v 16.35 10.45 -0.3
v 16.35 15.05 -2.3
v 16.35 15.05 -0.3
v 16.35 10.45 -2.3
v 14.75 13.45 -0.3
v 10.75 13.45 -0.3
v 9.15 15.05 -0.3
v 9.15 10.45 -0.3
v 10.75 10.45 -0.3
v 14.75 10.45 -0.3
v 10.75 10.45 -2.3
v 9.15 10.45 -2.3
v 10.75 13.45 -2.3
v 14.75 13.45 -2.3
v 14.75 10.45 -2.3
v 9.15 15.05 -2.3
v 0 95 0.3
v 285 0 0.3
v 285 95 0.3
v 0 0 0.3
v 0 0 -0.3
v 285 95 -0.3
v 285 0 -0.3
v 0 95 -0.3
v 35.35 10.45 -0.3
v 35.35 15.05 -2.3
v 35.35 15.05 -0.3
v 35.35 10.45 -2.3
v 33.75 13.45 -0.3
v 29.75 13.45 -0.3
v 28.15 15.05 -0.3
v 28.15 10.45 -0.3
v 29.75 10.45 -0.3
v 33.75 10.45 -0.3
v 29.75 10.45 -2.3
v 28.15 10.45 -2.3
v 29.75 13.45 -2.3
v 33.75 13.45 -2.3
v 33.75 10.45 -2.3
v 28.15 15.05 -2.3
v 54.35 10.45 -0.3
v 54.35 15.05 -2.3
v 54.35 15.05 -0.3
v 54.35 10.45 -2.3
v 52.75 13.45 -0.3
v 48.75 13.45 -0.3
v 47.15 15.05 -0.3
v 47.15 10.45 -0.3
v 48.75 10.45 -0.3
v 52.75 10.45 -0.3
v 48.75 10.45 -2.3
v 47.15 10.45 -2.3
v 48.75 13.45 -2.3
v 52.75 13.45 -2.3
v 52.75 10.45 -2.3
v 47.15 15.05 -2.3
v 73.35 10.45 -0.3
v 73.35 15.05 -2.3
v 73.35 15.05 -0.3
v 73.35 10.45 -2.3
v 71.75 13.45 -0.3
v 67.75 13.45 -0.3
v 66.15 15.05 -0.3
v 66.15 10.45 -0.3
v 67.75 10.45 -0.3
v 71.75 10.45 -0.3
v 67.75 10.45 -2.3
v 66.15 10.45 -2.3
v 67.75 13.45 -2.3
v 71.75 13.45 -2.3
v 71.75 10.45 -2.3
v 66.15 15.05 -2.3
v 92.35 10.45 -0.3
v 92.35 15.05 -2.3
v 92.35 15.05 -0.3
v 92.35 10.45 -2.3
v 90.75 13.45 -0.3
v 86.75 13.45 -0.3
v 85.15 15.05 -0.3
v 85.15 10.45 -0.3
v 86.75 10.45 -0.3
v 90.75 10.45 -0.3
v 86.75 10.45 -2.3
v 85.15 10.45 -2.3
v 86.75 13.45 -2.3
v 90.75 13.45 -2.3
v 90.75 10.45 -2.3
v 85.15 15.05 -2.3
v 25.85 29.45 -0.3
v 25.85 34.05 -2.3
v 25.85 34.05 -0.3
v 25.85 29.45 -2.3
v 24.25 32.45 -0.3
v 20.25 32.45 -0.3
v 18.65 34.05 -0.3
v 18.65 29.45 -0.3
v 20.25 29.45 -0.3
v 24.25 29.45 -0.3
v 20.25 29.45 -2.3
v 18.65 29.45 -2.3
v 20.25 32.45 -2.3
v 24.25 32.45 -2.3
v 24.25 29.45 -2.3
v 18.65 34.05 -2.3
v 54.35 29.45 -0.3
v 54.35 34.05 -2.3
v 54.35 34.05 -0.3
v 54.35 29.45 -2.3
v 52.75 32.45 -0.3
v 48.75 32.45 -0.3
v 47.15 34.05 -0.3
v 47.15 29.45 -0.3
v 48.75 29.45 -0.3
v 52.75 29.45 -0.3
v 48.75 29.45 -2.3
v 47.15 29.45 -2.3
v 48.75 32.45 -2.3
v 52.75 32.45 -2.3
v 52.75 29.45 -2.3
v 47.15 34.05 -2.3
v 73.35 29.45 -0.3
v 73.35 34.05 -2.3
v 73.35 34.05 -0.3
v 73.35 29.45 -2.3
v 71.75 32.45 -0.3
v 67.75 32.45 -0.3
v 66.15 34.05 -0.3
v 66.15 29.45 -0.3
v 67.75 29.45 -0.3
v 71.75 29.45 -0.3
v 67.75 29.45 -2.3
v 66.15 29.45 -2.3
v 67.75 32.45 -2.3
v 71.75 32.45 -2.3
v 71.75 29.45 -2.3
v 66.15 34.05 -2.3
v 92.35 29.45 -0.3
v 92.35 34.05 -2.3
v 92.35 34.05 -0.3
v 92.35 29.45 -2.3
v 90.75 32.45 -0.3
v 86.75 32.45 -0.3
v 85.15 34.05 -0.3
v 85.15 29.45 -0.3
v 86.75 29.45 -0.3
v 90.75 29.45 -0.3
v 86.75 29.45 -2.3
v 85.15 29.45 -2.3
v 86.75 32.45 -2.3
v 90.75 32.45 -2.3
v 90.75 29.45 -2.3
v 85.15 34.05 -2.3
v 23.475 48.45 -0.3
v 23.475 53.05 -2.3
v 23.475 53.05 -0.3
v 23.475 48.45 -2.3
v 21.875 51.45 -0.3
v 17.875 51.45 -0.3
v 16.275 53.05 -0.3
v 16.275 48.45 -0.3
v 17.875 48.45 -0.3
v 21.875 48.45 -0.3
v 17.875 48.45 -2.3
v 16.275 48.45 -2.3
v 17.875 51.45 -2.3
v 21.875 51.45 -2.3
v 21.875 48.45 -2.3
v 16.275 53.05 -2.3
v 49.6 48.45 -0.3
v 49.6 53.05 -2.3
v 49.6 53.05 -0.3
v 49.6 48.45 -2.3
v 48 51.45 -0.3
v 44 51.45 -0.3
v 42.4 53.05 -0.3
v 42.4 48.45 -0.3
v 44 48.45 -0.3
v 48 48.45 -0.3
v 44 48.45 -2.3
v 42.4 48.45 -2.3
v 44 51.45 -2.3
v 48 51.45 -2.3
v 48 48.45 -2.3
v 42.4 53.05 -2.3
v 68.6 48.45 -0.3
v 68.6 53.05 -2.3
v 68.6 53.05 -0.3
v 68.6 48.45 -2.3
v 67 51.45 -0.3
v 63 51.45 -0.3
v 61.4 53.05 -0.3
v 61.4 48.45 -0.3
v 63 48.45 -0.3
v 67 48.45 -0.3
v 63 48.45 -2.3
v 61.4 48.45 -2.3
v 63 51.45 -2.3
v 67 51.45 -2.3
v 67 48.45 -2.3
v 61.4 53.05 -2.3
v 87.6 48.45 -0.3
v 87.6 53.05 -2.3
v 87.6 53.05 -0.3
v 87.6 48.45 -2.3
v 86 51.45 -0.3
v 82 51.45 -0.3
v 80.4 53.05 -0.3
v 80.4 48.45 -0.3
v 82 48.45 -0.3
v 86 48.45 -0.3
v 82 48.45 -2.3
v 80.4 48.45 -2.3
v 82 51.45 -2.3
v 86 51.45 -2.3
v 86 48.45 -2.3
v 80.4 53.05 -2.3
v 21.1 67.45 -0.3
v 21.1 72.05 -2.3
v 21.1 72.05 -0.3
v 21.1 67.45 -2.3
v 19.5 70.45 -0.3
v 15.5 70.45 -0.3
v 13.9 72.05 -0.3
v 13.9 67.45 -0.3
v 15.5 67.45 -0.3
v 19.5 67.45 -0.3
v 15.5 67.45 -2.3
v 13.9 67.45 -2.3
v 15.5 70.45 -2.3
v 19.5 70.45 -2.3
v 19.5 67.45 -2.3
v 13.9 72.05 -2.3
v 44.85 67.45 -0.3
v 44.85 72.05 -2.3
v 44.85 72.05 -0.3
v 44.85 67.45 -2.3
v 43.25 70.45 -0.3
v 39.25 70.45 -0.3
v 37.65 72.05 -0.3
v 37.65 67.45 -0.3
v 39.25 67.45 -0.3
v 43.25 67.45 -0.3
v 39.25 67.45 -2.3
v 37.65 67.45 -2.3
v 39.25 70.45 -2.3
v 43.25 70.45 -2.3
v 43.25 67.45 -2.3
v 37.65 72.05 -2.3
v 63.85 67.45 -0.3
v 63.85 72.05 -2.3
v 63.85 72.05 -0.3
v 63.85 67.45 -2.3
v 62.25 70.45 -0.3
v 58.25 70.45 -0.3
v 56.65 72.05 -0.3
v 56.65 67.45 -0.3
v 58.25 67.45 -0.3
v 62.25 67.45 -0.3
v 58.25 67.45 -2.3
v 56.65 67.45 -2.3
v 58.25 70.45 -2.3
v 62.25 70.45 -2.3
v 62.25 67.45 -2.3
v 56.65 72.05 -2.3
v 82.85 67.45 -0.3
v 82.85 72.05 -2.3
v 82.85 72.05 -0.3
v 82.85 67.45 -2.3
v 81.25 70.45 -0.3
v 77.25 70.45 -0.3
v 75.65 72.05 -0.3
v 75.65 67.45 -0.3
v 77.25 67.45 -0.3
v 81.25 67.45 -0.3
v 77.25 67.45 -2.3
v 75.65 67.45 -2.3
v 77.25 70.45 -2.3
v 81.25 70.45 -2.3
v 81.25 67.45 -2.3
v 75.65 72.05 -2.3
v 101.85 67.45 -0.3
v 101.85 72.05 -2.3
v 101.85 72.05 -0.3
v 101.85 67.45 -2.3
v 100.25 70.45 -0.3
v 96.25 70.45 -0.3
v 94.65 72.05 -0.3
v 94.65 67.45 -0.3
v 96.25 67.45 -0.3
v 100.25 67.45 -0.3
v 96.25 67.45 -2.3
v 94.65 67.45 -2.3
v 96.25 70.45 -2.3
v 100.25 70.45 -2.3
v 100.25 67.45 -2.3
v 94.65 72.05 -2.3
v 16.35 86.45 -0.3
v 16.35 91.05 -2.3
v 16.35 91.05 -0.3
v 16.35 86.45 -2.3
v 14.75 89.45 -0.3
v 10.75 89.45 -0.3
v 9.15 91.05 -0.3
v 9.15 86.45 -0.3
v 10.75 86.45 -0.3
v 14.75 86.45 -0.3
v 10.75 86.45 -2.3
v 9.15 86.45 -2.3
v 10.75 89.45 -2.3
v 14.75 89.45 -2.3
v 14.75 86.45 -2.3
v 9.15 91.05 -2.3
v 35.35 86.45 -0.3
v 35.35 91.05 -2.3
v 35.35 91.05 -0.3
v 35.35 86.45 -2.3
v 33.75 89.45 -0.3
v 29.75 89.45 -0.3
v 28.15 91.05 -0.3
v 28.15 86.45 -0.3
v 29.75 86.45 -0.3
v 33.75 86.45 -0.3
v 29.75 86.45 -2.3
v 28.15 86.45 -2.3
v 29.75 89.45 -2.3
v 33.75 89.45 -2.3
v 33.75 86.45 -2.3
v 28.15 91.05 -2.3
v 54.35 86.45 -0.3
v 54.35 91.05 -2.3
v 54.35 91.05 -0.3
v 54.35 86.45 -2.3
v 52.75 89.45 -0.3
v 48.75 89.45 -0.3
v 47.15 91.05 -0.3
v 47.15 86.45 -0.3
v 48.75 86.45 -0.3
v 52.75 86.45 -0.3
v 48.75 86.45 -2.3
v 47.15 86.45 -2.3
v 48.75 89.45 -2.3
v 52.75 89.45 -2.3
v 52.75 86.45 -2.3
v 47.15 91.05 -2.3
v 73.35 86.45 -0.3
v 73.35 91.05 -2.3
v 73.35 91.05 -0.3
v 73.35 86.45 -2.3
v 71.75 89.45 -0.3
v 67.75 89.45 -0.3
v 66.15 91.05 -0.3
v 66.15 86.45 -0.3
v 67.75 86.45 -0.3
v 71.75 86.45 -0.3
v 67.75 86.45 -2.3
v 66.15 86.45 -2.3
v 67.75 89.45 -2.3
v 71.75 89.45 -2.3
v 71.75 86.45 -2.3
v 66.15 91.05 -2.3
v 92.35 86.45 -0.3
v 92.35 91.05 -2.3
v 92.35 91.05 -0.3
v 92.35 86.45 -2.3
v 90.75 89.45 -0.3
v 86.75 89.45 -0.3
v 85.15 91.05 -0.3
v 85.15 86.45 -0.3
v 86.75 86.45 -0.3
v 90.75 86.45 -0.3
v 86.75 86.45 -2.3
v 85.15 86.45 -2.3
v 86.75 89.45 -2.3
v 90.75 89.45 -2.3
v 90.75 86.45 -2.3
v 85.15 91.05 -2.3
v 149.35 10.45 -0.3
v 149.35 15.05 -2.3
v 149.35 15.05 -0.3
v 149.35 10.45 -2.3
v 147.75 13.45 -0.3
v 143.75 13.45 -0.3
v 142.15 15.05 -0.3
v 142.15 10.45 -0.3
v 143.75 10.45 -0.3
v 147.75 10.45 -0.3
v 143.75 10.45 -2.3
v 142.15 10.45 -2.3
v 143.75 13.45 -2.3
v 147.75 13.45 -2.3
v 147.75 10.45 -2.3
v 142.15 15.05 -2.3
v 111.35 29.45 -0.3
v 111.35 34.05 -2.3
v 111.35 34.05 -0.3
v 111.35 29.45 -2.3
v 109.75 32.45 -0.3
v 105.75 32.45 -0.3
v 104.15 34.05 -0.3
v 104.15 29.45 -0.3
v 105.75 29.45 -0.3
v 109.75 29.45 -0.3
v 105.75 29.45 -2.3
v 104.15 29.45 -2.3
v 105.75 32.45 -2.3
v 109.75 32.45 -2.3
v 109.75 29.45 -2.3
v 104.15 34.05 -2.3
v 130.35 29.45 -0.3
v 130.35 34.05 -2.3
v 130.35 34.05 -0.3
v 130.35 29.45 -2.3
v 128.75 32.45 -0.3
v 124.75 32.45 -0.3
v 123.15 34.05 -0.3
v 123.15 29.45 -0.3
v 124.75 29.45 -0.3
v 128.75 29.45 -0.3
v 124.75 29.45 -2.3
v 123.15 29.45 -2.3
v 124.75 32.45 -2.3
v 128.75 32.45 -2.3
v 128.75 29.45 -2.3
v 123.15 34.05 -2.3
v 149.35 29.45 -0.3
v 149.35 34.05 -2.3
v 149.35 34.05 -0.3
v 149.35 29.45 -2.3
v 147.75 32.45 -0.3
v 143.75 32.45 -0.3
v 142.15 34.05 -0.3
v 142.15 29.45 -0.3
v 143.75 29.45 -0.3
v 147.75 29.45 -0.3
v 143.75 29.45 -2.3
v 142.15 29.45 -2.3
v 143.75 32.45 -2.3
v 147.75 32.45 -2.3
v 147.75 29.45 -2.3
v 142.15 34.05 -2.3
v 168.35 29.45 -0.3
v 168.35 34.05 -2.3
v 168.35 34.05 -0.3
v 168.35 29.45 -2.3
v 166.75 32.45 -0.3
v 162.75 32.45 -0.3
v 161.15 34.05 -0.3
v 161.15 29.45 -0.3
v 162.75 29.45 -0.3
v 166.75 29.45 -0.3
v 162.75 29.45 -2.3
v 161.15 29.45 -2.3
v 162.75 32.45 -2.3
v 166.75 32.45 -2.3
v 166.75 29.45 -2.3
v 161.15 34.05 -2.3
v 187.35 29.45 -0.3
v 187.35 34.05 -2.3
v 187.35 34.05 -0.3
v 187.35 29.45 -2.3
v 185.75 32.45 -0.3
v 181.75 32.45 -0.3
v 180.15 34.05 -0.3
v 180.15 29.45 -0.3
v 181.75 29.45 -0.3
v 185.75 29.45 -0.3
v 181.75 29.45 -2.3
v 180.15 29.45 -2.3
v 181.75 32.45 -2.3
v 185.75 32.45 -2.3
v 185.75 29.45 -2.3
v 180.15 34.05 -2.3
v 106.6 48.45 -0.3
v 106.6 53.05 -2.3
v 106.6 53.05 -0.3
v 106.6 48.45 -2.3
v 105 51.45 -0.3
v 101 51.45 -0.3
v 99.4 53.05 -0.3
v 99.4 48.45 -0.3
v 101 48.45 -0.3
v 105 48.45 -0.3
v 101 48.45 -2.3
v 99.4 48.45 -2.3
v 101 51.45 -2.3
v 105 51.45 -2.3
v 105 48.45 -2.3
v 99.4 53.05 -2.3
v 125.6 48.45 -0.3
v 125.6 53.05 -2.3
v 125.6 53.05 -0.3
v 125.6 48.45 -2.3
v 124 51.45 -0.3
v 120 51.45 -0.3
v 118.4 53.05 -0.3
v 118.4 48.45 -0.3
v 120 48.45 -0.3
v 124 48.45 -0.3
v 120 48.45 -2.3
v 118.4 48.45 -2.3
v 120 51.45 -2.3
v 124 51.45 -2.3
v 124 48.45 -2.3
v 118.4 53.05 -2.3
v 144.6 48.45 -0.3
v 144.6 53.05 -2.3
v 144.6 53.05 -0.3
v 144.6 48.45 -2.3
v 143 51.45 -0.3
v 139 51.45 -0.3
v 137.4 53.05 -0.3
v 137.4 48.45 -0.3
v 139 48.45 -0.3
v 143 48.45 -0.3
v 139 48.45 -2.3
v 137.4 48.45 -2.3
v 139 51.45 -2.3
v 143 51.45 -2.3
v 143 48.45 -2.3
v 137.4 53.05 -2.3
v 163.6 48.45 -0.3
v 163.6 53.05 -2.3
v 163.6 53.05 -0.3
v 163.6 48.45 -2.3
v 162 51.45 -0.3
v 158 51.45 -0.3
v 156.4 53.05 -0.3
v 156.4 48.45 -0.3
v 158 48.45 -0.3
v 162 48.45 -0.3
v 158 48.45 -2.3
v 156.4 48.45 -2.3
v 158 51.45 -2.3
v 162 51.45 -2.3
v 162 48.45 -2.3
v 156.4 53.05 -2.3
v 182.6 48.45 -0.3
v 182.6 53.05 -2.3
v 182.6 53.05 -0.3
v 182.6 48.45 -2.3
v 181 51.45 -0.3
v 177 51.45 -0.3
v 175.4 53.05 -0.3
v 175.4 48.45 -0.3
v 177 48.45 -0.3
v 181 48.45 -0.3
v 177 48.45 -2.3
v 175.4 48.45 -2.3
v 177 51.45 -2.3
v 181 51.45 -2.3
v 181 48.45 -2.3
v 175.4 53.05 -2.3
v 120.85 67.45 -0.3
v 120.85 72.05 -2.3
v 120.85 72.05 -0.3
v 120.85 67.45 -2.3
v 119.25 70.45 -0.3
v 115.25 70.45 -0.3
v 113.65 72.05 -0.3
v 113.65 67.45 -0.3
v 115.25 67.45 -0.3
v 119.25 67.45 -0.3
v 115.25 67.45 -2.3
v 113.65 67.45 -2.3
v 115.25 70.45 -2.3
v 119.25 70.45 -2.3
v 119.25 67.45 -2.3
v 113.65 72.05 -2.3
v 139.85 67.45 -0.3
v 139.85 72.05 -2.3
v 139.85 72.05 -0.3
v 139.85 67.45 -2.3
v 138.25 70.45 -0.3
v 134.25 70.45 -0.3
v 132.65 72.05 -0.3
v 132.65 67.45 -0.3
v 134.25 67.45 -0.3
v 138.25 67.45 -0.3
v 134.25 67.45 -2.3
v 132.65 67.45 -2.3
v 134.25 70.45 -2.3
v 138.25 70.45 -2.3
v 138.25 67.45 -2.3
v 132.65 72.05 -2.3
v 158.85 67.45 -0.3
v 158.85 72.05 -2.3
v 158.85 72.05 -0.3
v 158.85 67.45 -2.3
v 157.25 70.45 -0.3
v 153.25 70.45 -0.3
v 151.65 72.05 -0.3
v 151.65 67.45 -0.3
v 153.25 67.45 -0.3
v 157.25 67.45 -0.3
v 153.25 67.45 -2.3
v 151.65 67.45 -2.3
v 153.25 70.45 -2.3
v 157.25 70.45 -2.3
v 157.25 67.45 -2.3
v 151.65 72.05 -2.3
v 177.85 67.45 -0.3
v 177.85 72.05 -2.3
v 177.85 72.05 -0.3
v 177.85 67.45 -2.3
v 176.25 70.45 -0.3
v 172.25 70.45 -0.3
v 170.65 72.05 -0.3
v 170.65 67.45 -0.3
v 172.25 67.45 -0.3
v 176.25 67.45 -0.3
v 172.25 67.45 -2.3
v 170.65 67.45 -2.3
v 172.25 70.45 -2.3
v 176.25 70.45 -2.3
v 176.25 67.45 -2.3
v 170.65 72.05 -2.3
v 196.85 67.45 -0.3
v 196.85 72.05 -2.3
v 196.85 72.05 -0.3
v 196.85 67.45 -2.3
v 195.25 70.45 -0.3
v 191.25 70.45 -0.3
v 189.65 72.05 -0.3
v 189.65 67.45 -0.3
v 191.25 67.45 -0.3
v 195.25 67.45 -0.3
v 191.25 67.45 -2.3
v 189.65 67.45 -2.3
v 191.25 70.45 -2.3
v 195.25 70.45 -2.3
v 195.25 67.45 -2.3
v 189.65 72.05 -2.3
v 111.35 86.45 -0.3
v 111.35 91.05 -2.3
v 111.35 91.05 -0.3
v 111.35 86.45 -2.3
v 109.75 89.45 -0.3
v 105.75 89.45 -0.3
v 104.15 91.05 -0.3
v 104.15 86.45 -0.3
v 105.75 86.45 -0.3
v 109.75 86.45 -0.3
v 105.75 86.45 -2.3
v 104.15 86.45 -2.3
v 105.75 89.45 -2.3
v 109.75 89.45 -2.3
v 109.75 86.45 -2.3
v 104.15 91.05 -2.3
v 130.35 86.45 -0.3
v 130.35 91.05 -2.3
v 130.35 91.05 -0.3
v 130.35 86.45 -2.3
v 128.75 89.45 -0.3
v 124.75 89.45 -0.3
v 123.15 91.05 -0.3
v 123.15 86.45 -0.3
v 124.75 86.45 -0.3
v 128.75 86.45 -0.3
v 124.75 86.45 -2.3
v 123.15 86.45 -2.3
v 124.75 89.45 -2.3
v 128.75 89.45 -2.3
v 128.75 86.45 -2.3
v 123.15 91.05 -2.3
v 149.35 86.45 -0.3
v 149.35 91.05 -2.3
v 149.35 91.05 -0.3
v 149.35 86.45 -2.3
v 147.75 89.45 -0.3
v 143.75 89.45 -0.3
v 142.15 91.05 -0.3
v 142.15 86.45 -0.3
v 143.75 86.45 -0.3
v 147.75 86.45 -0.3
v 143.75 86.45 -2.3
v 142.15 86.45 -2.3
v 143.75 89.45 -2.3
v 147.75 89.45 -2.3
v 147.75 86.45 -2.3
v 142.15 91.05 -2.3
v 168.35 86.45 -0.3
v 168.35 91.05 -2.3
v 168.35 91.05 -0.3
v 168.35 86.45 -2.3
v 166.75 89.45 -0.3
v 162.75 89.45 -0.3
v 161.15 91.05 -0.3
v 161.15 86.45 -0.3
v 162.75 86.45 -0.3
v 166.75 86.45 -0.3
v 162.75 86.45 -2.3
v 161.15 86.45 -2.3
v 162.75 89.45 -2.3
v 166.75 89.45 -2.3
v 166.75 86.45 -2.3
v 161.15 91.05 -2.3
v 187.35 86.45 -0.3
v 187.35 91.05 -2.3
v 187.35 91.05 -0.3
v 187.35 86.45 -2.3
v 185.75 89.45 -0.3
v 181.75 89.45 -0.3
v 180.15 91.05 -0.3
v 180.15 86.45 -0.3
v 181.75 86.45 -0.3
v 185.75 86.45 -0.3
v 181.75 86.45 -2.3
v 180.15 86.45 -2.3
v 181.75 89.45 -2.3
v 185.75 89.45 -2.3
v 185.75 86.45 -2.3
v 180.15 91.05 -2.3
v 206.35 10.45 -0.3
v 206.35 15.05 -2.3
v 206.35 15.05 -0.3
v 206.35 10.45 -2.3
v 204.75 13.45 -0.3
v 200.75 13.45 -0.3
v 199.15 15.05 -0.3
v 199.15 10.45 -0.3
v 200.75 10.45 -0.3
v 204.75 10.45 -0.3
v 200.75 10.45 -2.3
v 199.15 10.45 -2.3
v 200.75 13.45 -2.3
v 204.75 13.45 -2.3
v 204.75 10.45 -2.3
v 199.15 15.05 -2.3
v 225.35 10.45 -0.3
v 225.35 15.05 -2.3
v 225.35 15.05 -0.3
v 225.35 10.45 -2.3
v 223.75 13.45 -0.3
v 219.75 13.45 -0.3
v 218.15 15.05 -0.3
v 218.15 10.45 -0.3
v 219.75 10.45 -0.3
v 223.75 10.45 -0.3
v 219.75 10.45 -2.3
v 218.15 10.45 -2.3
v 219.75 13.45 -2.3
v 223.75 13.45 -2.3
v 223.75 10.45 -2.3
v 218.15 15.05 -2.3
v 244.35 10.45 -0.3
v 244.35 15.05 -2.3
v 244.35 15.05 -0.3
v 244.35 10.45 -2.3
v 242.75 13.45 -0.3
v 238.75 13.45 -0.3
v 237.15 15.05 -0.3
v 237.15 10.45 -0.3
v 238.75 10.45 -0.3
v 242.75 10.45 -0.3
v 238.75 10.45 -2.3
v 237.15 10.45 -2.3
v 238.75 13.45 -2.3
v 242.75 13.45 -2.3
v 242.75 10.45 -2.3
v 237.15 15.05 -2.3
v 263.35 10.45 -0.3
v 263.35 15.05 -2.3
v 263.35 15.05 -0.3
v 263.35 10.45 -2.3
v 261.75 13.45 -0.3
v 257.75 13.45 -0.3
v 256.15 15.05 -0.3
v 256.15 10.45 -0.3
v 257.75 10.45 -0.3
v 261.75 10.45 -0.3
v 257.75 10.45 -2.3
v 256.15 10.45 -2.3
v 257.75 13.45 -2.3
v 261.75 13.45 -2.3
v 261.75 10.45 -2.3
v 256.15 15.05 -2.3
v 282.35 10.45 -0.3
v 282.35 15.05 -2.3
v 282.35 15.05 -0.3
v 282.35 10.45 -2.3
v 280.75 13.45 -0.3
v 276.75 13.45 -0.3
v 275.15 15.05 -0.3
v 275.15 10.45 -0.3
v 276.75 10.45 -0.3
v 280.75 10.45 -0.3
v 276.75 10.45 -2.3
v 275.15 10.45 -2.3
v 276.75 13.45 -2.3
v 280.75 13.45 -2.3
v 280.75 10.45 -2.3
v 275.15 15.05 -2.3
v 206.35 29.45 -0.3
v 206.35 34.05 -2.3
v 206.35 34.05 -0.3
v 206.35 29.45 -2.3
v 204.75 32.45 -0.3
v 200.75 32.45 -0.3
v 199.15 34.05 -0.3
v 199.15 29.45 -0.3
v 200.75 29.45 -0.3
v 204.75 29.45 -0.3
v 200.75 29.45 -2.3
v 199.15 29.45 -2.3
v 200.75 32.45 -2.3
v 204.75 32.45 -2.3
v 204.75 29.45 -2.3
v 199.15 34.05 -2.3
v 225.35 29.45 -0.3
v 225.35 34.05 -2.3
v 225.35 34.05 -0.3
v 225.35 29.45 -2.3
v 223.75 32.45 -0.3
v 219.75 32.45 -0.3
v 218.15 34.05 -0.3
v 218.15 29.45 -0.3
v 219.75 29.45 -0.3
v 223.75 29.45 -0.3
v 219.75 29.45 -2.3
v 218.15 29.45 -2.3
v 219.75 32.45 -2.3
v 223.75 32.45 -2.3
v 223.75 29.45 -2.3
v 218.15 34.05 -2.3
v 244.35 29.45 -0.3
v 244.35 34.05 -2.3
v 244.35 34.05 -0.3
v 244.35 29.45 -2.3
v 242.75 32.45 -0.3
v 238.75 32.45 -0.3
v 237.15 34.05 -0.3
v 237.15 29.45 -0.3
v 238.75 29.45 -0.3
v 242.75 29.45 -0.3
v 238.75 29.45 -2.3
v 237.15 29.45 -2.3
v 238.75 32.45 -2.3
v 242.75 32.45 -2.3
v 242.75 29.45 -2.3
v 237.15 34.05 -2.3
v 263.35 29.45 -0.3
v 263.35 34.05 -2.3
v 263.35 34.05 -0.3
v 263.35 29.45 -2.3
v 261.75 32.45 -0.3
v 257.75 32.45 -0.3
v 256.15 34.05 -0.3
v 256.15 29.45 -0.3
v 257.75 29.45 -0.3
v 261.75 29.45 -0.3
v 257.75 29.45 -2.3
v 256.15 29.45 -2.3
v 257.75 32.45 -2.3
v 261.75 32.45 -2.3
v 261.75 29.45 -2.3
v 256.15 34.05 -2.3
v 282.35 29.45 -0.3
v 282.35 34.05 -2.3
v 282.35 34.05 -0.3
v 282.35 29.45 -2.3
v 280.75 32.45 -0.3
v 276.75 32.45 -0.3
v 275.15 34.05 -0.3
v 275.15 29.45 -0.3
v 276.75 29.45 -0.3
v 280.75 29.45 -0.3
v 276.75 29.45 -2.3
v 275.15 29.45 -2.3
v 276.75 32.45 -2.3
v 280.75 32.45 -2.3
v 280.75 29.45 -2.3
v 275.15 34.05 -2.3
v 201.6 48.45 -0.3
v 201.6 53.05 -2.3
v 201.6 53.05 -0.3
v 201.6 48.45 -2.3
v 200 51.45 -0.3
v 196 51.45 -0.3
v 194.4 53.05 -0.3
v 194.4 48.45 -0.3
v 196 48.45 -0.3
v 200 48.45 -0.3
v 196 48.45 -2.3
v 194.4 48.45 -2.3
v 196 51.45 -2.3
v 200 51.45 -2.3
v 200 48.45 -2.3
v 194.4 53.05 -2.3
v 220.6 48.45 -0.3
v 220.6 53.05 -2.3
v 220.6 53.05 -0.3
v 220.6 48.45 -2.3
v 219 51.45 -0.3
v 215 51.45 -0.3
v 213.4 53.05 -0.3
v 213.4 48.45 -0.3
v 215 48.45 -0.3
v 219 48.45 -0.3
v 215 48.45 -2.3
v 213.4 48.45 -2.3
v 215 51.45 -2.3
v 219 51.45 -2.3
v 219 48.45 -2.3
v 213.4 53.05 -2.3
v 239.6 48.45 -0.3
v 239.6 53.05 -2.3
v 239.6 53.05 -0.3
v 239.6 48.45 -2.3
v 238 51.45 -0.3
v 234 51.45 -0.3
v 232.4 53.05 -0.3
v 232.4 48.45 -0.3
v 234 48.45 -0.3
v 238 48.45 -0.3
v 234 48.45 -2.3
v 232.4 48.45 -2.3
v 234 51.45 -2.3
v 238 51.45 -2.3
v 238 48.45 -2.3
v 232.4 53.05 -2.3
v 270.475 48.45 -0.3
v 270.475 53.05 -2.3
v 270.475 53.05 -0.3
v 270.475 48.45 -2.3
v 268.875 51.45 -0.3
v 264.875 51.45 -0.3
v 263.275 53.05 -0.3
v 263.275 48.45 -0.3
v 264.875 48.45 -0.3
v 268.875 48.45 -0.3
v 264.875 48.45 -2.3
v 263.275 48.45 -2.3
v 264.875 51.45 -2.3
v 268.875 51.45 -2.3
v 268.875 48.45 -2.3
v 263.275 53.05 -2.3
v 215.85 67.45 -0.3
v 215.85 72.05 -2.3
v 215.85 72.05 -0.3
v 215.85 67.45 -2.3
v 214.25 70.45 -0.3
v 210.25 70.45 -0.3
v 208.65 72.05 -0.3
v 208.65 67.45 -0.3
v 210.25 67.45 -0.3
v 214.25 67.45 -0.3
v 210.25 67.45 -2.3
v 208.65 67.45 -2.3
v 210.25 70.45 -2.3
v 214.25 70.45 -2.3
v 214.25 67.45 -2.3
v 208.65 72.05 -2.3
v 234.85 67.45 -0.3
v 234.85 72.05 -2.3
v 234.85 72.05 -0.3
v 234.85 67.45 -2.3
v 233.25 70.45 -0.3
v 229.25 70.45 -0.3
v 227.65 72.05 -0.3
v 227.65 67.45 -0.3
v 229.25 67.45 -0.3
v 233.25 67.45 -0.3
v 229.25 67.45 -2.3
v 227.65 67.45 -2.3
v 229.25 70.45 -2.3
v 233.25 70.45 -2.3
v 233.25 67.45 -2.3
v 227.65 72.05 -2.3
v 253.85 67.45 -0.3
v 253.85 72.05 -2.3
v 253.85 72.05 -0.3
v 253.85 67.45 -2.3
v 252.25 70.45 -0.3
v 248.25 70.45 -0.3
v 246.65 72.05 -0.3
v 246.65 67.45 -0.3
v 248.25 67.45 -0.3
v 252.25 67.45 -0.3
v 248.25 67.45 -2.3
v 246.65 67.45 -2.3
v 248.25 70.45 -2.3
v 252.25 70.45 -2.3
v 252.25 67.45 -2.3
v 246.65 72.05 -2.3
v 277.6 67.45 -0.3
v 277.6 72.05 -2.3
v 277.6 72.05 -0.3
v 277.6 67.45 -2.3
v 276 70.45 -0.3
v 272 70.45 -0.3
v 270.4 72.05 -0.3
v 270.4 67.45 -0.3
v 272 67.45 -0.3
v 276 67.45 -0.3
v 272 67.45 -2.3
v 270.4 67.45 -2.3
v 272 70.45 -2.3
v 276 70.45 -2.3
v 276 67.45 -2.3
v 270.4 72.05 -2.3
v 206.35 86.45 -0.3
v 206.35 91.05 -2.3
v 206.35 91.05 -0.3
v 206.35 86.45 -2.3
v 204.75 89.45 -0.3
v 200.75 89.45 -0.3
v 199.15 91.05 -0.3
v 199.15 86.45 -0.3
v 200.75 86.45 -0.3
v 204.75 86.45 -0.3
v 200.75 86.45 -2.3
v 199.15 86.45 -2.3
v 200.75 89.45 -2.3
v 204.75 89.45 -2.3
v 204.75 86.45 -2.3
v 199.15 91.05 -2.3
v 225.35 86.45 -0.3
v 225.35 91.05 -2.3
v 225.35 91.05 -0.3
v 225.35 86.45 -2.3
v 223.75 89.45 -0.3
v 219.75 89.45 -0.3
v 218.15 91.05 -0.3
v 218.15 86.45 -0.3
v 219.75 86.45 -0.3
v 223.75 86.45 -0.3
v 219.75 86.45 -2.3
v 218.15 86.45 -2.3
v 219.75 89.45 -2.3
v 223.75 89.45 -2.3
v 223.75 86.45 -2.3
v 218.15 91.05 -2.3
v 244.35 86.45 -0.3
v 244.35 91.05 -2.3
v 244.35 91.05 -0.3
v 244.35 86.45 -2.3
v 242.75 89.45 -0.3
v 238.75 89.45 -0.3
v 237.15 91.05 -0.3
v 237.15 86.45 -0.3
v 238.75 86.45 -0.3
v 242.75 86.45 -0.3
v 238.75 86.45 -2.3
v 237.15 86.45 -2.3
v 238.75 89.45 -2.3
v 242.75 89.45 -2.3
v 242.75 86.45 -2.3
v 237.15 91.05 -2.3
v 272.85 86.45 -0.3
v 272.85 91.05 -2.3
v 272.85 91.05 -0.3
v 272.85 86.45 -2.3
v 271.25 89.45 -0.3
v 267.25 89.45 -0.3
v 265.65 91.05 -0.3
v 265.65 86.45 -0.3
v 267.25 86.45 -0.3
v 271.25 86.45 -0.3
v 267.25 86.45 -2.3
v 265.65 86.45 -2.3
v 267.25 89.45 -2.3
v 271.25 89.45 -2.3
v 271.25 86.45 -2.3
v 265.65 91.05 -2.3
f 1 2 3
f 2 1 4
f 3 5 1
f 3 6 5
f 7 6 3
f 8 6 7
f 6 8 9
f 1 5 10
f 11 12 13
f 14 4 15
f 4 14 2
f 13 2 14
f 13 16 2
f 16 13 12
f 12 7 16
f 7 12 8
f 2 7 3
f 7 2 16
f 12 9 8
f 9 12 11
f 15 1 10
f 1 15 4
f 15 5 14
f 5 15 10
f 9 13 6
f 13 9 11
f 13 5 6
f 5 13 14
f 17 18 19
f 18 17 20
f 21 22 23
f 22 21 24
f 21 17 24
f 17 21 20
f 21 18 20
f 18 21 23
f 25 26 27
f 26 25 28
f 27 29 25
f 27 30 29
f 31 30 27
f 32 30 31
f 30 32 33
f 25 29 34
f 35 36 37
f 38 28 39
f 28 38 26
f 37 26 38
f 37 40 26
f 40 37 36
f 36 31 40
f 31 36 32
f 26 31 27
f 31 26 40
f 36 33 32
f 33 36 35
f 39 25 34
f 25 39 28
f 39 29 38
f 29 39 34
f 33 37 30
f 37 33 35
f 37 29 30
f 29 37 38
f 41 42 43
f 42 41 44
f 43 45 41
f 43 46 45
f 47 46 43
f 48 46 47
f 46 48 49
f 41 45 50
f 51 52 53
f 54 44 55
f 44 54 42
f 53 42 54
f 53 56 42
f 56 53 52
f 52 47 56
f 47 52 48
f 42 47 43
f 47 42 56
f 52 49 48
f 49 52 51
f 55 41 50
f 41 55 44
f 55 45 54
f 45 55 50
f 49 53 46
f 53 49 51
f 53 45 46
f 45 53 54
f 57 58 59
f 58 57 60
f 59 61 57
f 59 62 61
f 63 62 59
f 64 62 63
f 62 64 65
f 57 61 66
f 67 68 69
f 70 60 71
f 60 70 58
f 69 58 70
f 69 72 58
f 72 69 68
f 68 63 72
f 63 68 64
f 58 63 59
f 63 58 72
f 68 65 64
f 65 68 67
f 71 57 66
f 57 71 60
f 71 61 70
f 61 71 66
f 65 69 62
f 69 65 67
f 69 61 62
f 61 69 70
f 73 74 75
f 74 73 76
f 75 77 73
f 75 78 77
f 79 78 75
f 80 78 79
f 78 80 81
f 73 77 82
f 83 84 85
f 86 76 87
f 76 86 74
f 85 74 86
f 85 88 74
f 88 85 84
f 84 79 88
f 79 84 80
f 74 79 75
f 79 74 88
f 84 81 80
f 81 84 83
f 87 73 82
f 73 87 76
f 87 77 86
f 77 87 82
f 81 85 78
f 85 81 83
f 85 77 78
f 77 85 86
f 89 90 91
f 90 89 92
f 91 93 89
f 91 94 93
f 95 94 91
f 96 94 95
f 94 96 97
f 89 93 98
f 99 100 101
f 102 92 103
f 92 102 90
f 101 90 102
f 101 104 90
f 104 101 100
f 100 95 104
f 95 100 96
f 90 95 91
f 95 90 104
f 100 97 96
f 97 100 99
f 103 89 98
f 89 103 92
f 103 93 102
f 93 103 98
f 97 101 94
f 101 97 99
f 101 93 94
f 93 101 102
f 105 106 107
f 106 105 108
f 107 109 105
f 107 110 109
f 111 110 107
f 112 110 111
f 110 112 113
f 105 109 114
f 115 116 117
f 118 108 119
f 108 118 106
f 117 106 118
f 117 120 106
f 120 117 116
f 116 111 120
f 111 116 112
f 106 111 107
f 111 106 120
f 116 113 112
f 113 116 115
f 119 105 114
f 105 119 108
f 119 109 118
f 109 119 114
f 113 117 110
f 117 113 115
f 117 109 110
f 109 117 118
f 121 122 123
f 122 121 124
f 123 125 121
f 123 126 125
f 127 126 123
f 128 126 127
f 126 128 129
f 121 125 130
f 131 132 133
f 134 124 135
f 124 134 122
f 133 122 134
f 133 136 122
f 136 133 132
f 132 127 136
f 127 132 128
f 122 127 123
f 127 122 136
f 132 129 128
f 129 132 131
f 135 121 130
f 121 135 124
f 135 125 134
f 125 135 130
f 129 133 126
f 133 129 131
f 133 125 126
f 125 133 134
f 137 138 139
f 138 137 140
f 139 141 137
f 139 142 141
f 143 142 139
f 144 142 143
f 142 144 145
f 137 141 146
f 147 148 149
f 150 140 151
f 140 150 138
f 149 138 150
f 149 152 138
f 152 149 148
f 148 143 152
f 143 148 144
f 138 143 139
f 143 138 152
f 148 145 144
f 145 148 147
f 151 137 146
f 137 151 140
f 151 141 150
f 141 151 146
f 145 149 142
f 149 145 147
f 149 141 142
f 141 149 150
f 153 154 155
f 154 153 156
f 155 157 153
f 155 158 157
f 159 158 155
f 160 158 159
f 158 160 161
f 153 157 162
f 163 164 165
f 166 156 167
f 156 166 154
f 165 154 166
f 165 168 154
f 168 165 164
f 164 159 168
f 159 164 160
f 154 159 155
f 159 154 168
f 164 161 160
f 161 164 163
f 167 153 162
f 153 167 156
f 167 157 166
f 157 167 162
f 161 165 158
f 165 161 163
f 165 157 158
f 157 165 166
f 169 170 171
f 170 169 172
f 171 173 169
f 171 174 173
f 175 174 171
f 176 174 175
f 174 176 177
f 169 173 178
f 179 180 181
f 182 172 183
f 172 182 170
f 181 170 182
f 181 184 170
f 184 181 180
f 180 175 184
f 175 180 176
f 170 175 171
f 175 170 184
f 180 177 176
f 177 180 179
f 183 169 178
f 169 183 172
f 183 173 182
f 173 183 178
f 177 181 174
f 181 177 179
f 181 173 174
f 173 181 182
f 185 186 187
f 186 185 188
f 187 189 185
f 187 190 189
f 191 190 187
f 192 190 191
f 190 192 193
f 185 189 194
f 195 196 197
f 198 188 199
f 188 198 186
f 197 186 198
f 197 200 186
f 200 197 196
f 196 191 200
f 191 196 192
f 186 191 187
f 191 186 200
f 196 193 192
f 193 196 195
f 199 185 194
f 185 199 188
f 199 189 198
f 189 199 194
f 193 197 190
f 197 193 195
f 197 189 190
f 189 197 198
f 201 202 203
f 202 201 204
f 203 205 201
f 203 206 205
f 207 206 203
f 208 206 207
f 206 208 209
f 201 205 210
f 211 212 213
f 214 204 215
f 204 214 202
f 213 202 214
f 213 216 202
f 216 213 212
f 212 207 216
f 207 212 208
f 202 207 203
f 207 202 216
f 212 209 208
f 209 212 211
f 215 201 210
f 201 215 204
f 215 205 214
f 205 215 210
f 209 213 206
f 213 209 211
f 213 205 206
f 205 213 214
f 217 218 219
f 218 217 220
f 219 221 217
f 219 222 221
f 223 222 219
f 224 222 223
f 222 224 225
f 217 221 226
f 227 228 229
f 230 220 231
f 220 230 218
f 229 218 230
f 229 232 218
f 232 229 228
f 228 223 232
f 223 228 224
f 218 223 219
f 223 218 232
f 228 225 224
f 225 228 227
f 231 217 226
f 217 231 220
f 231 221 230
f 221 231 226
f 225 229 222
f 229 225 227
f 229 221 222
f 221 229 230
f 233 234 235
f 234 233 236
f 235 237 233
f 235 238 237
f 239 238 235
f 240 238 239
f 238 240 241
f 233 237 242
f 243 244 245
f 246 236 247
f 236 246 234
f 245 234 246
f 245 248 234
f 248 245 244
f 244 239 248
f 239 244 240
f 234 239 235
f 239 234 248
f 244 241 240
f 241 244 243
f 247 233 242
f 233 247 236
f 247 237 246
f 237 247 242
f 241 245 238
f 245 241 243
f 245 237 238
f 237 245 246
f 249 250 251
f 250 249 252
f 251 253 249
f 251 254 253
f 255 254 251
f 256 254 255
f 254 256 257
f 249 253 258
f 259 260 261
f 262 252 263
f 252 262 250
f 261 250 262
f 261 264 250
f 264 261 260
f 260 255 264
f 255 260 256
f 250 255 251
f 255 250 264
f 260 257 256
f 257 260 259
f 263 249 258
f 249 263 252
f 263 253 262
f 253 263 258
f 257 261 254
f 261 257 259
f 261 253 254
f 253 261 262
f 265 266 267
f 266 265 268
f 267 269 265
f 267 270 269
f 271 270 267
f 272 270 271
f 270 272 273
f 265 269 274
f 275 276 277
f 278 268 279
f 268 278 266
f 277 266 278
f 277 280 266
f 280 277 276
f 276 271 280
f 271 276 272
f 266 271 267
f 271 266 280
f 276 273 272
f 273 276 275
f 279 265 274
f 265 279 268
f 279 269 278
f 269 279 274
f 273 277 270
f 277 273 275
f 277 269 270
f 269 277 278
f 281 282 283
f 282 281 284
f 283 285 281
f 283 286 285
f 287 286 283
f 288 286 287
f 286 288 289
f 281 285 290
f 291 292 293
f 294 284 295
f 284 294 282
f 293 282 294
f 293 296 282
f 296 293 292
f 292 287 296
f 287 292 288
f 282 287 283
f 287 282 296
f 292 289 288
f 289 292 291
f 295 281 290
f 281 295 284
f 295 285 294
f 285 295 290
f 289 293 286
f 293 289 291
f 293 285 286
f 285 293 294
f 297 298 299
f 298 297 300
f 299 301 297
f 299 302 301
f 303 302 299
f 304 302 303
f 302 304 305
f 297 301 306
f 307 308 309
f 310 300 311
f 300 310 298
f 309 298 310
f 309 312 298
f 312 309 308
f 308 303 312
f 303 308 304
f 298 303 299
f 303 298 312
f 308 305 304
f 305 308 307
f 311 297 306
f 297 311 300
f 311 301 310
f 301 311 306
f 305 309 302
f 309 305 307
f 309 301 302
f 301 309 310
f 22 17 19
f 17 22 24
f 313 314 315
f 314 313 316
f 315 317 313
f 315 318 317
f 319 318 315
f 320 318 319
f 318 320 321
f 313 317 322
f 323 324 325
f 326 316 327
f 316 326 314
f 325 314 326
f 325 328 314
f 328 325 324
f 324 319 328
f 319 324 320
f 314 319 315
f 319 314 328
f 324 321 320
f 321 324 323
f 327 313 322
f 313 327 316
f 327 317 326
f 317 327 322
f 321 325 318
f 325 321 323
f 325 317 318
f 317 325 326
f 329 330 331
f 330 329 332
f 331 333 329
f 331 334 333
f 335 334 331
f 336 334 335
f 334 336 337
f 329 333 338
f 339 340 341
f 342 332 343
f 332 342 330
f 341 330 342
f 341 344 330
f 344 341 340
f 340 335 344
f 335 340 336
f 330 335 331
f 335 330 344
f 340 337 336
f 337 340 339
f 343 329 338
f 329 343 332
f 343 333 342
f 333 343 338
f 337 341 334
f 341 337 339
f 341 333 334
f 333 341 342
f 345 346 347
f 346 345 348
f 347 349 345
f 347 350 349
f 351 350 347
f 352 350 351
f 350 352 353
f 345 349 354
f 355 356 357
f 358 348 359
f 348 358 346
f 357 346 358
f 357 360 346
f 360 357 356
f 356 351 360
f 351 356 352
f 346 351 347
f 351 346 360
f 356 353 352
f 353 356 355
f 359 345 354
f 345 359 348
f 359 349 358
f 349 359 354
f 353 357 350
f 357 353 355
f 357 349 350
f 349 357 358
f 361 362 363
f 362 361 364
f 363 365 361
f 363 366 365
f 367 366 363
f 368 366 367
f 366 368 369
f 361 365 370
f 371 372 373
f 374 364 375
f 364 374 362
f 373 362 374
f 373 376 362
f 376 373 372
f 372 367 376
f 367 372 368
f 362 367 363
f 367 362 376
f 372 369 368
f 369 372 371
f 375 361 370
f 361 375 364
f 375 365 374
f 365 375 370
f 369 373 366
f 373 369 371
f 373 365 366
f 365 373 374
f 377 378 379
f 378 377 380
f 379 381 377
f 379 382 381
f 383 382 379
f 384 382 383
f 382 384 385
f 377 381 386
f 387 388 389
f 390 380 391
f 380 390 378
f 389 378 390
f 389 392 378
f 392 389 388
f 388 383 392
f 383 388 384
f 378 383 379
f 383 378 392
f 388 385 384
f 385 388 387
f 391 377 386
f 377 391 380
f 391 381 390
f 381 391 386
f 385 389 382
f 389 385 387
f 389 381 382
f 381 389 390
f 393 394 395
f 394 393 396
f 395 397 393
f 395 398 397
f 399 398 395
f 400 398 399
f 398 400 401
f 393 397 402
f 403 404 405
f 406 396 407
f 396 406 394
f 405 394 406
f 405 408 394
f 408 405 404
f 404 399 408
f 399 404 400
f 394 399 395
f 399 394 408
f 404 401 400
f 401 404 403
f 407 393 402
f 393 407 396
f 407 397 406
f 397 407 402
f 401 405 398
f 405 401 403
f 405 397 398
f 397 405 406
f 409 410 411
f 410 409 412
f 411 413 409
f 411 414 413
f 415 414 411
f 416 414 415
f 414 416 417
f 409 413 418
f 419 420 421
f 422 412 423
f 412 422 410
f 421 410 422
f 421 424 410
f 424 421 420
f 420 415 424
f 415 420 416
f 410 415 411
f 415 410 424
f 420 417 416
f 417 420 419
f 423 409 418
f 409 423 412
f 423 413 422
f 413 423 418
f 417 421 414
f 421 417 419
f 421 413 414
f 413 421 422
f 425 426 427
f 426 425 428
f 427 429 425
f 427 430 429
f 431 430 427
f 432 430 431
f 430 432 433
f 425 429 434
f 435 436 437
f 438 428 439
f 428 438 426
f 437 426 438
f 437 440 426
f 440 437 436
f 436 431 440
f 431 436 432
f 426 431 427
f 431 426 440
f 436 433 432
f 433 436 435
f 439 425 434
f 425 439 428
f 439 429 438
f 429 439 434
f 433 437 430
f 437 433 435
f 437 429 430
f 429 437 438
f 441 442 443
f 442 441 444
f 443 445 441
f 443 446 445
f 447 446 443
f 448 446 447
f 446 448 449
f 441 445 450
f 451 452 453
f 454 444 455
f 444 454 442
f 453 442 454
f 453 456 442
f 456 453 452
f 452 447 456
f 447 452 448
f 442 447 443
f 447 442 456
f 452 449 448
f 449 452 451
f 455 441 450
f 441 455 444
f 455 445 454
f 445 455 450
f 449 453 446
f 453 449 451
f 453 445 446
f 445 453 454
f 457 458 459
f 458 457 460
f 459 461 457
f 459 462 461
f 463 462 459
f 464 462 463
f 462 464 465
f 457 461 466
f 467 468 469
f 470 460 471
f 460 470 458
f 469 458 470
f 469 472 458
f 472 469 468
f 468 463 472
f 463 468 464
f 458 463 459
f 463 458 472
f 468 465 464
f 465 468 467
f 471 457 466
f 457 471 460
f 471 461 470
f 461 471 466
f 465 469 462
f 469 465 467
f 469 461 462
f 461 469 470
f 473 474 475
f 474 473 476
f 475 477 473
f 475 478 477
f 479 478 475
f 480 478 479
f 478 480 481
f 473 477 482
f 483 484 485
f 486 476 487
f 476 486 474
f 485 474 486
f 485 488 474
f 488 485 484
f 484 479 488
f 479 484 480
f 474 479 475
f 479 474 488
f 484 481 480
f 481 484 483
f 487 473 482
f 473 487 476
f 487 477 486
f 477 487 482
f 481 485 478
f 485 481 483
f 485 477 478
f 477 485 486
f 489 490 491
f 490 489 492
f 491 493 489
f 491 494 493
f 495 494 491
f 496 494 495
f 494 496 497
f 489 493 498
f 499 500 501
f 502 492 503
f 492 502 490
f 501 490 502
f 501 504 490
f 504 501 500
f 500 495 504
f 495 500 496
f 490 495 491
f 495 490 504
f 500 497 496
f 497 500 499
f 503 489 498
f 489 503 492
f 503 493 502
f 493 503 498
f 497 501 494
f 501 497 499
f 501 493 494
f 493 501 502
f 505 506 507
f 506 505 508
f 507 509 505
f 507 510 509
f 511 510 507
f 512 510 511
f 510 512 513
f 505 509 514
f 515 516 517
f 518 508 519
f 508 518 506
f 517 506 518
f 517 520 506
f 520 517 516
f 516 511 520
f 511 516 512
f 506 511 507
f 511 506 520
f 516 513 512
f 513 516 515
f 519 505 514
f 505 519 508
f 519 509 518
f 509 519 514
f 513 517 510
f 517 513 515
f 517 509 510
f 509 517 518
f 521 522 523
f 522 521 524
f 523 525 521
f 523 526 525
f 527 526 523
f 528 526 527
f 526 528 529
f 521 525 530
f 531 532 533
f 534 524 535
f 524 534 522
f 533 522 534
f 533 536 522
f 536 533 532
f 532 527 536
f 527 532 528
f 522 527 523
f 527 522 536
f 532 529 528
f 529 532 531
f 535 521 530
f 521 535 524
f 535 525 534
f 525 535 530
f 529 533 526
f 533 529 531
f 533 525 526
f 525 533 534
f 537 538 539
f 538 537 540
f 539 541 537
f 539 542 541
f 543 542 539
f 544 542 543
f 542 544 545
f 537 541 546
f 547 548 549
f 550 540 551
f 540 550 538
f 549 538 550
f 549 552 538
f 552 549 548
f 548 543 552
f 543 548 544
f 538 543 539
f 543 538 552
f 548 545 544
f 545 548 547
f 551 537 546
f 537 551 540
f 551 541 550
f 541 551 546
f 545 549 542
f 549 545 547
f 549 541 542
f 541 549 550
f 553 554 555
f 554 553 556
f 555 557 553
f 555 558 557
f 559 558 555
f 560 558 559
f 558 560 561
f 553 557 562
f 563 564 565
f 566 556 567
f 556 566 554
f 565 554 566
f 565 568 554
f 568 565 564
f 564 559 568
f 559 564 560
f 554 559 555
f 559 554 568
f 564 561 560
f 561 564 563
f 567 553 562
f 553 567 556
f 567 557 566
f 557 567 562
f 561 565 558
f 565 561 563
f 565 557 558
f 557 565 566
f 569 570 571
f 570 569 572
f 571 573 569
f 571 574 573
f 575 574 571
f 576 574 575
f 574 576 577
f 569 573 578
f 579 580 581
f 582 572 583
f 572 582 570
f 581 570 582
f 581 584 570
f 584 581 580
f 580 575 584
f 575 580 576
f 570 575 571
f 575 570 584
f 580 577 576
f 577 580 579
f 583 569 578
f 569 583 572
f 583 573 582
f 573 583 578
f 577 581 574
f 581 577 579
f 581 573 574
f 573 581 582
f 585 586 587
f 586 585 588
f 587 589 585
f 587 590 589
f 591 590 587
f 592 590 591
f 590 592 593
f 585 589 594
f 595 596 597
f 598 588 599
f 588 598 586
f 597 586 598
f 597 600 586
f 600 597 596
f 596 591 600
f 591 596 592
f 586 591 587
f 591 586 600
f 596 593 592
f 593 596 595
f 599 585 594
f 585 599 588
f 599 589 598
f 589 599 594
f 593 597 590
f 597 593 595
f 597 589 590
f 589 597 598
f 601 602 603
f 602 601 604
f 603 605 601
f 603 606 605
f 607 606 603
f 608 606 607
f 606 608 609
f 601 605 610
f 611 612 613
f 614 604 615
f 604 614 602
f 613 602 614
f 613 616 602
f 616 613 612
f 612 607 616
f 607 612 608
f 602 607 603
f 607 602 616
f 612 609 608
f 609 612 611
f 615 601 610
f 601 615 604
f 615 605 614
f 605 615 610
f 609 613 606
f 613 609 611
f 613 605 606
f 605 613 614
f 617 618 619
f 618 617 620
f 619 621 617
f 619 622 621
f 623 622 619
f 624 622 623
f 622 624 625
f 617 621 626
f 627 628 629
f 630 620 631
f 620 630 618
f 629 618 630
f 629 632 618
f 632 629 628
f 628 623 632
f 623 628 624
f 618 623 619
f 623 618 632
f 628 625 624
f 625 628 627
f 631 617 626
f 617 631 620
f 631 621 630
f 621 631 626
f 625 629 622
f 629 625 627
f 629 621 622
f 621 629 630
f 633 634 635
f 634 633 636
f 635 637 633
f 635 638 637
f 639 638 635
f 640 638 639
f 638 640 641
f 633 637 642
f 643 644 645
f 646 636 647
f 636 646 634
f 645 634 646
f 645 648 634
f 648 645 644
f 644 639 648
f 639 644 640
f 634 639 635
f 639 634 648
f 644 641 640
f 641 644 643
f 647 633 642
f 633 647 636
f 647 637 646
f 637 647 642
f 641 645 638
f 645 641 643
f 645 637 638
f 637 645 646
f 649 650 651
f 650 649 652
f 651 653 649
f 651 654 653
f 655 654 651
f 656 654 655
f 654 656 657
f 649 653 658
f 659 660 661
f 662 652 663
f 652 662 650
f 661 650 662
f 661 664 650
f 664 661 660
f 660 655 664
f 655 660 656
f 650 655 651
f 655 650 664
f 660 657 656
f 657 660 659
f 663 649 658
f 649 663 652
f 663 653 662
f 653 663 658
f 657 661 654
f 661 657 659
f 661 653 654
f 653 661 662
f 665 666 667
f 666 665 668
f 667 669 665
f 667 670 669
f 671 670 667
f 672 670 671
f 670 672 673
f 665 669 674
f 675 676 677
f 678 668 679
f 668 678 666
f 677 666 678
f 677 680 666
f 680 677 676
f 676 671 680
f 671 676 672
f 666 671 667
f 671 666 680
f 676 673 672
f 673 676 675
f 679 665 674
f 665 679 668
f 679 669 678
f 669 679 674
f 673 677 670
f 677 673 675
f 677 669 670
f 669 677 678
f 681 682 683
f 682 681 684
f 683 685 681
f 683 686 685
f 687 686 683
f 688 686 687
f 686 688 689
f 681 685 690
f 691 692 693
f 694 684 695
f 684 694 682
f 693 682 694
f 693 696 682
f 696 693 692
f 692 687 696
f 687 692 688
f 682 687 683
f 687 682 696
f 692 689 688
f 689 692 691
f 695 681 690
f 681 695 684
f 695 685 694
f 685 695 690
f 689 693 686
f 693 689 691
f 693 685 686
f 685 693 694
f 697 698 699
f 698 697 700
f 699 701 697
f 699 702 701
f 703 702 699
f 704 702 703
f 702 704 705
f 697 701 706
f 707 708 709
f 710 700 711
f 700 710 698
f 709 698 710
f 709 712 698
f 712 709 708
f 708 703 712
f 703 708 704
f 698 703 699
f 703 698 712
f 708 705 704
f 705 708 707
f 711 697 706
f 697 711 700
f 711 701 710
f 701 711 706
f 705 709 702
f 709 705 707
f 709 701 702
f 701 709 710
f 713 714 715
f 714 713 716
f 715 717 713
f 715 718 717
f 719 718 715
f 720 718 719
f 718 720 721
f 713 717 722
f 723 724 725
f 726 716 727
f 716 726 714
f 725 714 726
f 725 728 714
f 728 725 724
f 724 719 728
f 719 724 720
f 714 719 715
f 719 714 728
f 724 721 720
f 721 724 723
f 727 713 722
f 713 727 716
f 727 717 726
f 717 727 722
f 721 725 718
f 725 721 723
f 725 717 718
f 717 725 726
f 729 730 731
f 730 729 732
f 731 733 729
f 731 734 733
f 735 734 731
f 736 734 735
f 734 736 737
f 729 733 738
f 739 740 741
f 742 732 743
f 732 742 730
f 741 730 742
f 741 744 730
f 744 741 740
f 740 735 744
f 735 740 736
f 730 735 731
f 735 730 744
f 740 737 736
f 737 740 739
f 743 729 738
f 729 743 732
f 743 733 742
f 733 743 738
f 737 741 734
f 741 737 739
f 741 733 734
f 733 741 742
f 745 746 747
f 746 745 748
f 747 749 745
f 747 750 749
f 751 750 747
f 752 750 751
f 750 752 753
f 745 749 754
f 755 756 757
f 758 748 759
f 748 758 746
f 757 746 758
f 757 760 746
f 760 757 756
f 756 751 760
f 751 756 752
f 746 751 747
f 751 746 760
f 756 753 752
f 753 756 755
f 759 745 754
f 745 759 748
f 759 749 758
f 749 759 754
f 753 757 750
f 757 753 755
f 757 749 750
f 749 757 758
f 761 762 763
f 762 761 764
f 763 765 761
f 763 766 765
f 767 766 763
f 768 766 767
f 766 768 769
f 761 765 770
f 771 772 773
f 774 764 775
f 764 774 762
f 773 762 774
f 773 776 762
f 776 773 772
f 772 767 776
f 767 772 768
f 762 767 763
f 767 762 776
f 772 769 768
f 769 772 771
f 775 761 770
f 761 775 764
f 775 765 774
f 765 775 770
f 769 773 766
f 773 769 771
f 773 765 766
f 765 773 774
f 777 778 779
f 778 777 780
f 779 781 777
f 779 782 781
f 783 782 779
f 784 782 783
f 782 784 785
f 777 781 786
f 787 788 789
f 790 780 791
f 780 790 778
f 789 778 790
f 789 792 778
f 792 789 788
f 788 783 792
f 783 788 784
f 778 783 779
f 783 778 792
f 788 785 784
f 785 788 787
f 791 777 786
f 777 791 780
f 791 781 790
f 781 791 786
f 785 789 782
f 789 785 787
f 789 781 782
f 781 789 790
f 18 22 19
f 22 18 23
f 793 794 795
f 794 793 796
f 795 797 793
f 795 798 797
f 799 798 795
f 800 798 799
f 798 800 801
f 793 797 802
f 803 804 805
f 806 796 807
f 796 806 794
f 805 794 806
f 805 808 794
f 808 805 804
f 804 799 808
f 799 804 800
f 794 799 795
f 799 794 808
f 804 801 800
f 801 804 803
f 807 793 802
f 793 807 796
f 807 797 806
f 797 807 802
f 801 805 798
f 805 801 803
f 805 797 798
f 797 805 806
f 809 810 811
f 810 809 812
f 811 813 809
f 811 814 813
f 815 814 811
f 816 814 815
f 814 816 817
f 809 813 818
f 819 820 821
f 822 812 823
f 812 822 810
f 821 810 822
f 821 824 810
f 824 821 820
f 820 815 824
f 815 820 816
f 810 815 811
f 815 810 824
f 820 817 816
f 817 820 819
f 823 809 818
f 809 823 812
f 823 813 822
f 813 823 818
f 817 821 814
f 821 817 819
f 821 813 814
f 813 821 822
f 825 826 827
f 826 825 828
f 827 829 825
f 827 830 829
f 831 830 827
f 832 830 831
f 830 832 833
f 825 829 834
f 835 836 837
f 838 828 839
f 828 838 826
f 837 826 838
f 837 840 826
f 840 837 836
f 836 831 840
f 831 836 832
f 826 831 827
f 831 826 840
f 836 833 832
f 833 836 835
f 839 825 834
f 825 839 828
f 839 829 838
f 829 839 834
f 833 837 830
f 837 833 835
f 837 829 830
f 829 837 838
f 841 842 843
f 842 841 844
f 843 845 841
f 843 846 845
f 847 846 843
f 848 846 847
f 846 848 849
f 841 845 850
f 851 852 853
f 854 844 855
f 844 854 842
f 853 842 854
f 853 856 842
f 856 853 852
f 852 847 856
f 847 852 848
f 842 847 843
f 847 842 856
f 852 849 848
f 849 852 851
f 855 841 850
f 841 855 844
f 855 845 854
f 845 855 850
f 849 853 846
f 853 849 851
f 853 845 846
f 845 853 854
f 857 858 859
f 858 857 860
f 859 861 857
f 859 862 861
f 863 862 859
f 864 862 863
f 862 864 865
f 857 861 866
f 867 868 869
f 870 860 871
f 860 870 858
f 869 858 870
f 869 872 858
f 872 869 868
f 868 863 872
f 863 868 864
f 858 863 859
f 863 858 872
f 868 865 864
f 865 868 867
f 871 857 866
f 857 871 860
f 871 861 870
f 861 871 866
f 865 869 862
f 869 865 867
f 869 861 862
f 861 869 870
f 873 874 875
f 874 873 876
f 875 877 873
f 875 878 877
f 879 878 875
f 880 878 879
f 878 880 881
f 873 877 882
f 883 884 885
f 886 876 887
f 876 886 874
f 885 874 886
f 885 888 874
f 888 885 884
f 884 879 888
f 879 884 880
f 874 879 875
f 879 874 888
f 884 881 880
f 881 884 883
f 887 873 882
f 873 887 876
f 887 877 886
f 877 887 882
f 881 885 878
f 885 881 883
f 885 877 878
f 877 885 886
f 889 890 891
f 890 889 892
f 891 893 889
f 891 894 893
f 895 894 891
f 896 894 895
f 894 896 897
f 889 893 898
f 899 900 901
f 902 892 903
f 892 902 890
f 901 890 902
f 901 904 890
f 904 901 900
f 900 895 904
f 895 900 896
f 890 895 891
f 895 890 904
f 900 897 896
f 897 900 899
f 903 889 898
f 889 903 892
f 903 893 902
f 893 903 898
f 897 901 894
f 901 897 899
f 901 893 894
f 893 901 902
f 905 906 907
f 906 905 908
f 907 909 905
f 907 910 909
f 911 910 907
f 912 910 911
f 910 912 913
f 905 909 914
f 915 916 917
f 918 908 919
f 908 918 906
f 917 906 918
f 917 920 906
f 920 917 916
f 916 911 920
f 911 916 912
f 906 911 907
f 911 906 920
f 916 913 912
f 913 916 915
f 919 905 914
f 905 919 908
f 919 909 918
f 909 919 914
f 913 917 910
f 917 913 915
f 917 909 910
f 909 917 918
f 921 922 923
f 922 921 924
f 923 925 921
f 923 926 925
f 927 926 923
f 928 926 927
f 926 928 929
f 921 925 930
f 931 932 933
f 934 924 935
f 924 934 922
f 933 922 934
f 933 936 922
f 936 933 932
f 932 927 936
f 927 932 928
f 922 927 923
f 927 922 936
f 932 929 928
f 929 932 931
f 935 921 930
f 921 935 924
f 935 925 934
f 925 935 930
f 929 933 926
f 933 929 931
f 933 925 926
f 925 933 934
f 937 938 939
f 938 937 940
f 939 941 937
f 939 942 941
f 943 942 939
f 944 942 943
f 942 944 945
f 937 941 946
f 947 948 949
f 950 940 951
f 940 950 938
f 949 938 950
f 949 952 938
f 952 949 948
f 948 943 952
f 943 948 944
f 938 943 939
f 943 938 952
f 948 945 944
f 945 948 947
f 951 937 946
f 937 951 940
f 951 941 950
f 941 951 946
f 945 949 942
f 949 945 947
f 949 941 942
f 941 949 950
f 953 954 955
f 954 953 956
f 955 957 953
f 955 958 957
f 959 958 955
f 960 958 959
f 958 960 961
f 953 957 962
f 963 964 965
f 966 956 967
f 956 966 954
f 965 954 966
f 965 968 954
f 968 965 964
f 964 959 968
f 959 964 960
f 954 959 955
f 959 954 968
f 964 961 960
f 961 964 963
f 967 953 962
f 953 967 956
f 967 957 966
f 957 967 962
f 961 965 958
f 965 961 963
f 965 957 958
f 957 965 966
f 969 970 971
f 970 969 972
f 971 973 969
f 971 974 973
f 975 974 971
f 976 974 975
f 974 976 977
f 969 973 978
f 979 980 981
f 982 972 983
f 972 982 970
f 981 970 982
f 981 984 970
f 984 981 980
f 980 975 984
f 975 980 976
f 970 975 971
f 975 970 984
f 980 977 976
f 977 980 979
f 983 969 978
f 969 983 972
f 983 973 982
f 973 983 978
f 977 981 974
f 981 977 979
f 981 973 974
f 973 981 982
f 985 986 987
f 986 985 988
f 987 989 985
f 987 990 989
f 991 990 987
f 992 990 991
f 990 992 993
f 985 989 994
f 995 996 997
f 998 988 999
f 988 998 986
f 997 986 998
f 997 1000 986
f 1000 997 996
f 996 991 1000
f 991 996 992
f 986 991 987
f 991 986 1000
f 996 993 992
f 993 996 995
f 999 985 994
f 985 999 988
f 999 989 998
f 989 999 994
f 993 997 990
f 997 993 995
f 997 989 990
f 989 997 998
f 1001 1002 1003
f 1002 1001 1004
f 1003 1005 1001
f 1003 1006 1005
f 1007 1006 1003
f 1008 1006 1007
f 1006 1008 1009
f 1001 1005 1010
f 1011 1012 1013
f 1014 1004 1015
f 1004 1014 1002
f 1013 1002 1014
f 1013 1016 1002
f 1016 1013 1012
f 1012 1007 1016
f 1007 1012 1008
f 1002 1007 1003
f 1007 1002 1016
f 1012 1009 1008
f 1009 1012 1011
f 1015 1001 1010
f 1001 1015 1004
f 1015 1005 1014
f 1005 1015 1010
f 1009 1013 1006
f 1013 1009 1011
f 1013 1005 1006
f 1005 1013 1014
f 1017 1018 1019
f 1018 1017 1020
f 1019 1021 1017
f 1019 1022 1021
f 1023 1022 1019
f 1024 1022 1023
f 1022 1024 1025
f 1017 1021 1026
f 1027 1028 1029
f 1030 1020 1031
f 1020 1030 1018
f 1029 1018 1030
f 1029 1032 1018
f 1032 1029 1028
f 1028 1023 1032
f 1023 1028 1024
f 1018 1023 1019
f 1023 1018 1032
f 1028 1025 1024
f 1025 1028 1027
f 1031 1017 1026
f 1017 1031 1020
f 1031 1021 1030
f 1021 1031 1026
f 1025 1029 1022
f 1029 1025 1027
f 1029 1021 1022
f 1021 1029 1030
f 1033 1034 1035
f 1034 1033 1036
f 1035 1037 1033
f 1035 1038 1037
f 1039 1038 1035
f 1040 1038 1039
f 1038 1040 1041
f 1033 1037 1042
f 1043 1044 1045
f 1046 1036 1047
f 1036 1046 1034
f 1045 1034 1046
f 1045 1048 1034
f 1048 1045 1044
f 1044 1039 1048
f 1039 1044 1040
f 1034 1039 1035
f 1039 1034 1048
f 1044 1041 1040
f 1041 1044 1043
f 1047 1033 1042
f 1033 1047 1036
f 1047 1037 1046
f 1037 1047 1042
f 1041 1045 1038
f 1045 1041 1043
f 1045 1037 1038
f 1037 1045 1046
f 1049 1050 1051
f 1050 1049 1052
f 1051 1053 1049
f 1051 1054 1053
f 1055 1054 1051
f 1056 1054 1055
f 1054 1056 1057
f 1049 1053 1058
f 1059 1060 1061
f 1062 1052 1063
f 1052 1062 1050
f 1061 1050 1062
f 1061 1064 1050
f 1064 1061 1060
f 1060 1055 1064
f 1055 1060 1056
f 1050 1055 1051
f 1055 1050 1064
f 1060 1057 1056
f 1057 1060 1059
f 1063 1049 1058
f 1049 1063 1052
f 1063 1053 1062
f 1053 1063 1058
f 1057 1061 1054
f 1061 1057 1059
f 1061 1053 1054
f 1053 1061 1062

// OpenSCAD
// file: util.scad
function sumTo(list, end, index = 0, accum = 0) =
  (index < len(list) && index < end + 1) ?
    sumTo(list, end, index + 1, accum + list[index]) :
    accum;
// file: sensorScaffold.scad
include <util.scad>

module SensorScaffold(
  baseColumnWidth,
  rowDepth,
  rows,
  sensorDimensions,
  sensorOffset,
  plateMargin,
  plateHeight,
  scaffoldWidth,
  section,
  split
) {
  for(rowIndex = [0 : len(rows) - 1])
    let(rowOffset = (rowIndex + 1) * rowDepth) {
      for(colIndex = [0 : len(rows[rowIndex]) - 1])
        let(
          colOffset = baseColumnWidth * sumTo(rows[rowIndex], colIndex),
          width = baseColumnWidth * rows[rowIndex][colIndex]
        ) {
          if (section == "undefined" || (split && split[rowIndex] && colIndex <= split[rowIndex][section] && (section == 0 ? true : colIndex > split[rowIndex][section - 1])))
            translate([colOffset - width / 2, rowOffset - rowDepth / 2, 0])  
              union() {
                cube([width, rowDepth, plateHeight], true); // for debug
                translate([sensorOffset[0], sensorOffset[1], -(plateHeight + sensorDimensions[2]) / 2])
                  difference() {
                    cube([sensorDimensions[0] + 2 * scaffoldWidth, sensorDimensions[1] + scaffoldWidth, sensorDimensions[2]], true);
                    translate([0, -scaffoldWidth, 0])
                      cube([sensorDimensions[0], sensorDimensions[1] + scaffoldWidth, sensorDimensions[2] + 1], true);
                  }
              }
        }    
    }
};
// main file
use <sensorScaffold.scad>

$fn = 8;

rows = [
  [1, 1, 1, 1, 1, 5, 1, 1, 1, 1, 1],
  [2, 1, 1, 1, 1, 1, 1, 1, 1, 1, 1, 1, 1, 1],
  [1.75, 1, 1, 1, 1, 1, 1, 1, 1, 1, 1, 1, 2.25],
  [1.5, 1, 1, 1, 1, 1, 1, 1, 1, 1, 1, 1, 1, 1.5],
  [1, 1, 1, 1, 1, 1, 1, 1, 1, 1, 1, 1, 1, 2],
];

split = [
  [4, 5, 10],
  [3, 8, 13],
  [3, 8, 12],
  [4, 9, 13],
  [4, 9, 13]
];

// a3144
sensorDimensions = [4, 3, 2]; 
sensorWireDimensions = [8, .2];

rowDepth = 19;
baseColumnWidth = 19;
sensorOffset = [3.25, 3.25];
plateMargin = 4;
plateHeight = .6;
scaffoldWidth = 1.6;


color([1, 0, 0]) SensorScaffold(
  baseColumnWidth,
  rowDepth,
  rows,
  sensorDimensions,
  sensorOffset,
  plateMargin,
  plateHeight,
  scaffoldWidth,
  0,
  split
);

color([0, 1, 0]) SensorScaffold(
  baseColumnWidth,
  rowDepth,
  rows,
  sensorDimensions,
  sensorOffset,
  plateMargin,
  plateHeight,
  scaffoldWidth,
  1,
  split
);

color([0, 0, 1]) SensorScaffold(
  baseColumnWidth,
  rowDepth,
  rows,
  sensorDimensions,
  sensorOffset,
  plateMargin,
  plateHeight,
  scaffoldWidth,
  2,
  split
);
